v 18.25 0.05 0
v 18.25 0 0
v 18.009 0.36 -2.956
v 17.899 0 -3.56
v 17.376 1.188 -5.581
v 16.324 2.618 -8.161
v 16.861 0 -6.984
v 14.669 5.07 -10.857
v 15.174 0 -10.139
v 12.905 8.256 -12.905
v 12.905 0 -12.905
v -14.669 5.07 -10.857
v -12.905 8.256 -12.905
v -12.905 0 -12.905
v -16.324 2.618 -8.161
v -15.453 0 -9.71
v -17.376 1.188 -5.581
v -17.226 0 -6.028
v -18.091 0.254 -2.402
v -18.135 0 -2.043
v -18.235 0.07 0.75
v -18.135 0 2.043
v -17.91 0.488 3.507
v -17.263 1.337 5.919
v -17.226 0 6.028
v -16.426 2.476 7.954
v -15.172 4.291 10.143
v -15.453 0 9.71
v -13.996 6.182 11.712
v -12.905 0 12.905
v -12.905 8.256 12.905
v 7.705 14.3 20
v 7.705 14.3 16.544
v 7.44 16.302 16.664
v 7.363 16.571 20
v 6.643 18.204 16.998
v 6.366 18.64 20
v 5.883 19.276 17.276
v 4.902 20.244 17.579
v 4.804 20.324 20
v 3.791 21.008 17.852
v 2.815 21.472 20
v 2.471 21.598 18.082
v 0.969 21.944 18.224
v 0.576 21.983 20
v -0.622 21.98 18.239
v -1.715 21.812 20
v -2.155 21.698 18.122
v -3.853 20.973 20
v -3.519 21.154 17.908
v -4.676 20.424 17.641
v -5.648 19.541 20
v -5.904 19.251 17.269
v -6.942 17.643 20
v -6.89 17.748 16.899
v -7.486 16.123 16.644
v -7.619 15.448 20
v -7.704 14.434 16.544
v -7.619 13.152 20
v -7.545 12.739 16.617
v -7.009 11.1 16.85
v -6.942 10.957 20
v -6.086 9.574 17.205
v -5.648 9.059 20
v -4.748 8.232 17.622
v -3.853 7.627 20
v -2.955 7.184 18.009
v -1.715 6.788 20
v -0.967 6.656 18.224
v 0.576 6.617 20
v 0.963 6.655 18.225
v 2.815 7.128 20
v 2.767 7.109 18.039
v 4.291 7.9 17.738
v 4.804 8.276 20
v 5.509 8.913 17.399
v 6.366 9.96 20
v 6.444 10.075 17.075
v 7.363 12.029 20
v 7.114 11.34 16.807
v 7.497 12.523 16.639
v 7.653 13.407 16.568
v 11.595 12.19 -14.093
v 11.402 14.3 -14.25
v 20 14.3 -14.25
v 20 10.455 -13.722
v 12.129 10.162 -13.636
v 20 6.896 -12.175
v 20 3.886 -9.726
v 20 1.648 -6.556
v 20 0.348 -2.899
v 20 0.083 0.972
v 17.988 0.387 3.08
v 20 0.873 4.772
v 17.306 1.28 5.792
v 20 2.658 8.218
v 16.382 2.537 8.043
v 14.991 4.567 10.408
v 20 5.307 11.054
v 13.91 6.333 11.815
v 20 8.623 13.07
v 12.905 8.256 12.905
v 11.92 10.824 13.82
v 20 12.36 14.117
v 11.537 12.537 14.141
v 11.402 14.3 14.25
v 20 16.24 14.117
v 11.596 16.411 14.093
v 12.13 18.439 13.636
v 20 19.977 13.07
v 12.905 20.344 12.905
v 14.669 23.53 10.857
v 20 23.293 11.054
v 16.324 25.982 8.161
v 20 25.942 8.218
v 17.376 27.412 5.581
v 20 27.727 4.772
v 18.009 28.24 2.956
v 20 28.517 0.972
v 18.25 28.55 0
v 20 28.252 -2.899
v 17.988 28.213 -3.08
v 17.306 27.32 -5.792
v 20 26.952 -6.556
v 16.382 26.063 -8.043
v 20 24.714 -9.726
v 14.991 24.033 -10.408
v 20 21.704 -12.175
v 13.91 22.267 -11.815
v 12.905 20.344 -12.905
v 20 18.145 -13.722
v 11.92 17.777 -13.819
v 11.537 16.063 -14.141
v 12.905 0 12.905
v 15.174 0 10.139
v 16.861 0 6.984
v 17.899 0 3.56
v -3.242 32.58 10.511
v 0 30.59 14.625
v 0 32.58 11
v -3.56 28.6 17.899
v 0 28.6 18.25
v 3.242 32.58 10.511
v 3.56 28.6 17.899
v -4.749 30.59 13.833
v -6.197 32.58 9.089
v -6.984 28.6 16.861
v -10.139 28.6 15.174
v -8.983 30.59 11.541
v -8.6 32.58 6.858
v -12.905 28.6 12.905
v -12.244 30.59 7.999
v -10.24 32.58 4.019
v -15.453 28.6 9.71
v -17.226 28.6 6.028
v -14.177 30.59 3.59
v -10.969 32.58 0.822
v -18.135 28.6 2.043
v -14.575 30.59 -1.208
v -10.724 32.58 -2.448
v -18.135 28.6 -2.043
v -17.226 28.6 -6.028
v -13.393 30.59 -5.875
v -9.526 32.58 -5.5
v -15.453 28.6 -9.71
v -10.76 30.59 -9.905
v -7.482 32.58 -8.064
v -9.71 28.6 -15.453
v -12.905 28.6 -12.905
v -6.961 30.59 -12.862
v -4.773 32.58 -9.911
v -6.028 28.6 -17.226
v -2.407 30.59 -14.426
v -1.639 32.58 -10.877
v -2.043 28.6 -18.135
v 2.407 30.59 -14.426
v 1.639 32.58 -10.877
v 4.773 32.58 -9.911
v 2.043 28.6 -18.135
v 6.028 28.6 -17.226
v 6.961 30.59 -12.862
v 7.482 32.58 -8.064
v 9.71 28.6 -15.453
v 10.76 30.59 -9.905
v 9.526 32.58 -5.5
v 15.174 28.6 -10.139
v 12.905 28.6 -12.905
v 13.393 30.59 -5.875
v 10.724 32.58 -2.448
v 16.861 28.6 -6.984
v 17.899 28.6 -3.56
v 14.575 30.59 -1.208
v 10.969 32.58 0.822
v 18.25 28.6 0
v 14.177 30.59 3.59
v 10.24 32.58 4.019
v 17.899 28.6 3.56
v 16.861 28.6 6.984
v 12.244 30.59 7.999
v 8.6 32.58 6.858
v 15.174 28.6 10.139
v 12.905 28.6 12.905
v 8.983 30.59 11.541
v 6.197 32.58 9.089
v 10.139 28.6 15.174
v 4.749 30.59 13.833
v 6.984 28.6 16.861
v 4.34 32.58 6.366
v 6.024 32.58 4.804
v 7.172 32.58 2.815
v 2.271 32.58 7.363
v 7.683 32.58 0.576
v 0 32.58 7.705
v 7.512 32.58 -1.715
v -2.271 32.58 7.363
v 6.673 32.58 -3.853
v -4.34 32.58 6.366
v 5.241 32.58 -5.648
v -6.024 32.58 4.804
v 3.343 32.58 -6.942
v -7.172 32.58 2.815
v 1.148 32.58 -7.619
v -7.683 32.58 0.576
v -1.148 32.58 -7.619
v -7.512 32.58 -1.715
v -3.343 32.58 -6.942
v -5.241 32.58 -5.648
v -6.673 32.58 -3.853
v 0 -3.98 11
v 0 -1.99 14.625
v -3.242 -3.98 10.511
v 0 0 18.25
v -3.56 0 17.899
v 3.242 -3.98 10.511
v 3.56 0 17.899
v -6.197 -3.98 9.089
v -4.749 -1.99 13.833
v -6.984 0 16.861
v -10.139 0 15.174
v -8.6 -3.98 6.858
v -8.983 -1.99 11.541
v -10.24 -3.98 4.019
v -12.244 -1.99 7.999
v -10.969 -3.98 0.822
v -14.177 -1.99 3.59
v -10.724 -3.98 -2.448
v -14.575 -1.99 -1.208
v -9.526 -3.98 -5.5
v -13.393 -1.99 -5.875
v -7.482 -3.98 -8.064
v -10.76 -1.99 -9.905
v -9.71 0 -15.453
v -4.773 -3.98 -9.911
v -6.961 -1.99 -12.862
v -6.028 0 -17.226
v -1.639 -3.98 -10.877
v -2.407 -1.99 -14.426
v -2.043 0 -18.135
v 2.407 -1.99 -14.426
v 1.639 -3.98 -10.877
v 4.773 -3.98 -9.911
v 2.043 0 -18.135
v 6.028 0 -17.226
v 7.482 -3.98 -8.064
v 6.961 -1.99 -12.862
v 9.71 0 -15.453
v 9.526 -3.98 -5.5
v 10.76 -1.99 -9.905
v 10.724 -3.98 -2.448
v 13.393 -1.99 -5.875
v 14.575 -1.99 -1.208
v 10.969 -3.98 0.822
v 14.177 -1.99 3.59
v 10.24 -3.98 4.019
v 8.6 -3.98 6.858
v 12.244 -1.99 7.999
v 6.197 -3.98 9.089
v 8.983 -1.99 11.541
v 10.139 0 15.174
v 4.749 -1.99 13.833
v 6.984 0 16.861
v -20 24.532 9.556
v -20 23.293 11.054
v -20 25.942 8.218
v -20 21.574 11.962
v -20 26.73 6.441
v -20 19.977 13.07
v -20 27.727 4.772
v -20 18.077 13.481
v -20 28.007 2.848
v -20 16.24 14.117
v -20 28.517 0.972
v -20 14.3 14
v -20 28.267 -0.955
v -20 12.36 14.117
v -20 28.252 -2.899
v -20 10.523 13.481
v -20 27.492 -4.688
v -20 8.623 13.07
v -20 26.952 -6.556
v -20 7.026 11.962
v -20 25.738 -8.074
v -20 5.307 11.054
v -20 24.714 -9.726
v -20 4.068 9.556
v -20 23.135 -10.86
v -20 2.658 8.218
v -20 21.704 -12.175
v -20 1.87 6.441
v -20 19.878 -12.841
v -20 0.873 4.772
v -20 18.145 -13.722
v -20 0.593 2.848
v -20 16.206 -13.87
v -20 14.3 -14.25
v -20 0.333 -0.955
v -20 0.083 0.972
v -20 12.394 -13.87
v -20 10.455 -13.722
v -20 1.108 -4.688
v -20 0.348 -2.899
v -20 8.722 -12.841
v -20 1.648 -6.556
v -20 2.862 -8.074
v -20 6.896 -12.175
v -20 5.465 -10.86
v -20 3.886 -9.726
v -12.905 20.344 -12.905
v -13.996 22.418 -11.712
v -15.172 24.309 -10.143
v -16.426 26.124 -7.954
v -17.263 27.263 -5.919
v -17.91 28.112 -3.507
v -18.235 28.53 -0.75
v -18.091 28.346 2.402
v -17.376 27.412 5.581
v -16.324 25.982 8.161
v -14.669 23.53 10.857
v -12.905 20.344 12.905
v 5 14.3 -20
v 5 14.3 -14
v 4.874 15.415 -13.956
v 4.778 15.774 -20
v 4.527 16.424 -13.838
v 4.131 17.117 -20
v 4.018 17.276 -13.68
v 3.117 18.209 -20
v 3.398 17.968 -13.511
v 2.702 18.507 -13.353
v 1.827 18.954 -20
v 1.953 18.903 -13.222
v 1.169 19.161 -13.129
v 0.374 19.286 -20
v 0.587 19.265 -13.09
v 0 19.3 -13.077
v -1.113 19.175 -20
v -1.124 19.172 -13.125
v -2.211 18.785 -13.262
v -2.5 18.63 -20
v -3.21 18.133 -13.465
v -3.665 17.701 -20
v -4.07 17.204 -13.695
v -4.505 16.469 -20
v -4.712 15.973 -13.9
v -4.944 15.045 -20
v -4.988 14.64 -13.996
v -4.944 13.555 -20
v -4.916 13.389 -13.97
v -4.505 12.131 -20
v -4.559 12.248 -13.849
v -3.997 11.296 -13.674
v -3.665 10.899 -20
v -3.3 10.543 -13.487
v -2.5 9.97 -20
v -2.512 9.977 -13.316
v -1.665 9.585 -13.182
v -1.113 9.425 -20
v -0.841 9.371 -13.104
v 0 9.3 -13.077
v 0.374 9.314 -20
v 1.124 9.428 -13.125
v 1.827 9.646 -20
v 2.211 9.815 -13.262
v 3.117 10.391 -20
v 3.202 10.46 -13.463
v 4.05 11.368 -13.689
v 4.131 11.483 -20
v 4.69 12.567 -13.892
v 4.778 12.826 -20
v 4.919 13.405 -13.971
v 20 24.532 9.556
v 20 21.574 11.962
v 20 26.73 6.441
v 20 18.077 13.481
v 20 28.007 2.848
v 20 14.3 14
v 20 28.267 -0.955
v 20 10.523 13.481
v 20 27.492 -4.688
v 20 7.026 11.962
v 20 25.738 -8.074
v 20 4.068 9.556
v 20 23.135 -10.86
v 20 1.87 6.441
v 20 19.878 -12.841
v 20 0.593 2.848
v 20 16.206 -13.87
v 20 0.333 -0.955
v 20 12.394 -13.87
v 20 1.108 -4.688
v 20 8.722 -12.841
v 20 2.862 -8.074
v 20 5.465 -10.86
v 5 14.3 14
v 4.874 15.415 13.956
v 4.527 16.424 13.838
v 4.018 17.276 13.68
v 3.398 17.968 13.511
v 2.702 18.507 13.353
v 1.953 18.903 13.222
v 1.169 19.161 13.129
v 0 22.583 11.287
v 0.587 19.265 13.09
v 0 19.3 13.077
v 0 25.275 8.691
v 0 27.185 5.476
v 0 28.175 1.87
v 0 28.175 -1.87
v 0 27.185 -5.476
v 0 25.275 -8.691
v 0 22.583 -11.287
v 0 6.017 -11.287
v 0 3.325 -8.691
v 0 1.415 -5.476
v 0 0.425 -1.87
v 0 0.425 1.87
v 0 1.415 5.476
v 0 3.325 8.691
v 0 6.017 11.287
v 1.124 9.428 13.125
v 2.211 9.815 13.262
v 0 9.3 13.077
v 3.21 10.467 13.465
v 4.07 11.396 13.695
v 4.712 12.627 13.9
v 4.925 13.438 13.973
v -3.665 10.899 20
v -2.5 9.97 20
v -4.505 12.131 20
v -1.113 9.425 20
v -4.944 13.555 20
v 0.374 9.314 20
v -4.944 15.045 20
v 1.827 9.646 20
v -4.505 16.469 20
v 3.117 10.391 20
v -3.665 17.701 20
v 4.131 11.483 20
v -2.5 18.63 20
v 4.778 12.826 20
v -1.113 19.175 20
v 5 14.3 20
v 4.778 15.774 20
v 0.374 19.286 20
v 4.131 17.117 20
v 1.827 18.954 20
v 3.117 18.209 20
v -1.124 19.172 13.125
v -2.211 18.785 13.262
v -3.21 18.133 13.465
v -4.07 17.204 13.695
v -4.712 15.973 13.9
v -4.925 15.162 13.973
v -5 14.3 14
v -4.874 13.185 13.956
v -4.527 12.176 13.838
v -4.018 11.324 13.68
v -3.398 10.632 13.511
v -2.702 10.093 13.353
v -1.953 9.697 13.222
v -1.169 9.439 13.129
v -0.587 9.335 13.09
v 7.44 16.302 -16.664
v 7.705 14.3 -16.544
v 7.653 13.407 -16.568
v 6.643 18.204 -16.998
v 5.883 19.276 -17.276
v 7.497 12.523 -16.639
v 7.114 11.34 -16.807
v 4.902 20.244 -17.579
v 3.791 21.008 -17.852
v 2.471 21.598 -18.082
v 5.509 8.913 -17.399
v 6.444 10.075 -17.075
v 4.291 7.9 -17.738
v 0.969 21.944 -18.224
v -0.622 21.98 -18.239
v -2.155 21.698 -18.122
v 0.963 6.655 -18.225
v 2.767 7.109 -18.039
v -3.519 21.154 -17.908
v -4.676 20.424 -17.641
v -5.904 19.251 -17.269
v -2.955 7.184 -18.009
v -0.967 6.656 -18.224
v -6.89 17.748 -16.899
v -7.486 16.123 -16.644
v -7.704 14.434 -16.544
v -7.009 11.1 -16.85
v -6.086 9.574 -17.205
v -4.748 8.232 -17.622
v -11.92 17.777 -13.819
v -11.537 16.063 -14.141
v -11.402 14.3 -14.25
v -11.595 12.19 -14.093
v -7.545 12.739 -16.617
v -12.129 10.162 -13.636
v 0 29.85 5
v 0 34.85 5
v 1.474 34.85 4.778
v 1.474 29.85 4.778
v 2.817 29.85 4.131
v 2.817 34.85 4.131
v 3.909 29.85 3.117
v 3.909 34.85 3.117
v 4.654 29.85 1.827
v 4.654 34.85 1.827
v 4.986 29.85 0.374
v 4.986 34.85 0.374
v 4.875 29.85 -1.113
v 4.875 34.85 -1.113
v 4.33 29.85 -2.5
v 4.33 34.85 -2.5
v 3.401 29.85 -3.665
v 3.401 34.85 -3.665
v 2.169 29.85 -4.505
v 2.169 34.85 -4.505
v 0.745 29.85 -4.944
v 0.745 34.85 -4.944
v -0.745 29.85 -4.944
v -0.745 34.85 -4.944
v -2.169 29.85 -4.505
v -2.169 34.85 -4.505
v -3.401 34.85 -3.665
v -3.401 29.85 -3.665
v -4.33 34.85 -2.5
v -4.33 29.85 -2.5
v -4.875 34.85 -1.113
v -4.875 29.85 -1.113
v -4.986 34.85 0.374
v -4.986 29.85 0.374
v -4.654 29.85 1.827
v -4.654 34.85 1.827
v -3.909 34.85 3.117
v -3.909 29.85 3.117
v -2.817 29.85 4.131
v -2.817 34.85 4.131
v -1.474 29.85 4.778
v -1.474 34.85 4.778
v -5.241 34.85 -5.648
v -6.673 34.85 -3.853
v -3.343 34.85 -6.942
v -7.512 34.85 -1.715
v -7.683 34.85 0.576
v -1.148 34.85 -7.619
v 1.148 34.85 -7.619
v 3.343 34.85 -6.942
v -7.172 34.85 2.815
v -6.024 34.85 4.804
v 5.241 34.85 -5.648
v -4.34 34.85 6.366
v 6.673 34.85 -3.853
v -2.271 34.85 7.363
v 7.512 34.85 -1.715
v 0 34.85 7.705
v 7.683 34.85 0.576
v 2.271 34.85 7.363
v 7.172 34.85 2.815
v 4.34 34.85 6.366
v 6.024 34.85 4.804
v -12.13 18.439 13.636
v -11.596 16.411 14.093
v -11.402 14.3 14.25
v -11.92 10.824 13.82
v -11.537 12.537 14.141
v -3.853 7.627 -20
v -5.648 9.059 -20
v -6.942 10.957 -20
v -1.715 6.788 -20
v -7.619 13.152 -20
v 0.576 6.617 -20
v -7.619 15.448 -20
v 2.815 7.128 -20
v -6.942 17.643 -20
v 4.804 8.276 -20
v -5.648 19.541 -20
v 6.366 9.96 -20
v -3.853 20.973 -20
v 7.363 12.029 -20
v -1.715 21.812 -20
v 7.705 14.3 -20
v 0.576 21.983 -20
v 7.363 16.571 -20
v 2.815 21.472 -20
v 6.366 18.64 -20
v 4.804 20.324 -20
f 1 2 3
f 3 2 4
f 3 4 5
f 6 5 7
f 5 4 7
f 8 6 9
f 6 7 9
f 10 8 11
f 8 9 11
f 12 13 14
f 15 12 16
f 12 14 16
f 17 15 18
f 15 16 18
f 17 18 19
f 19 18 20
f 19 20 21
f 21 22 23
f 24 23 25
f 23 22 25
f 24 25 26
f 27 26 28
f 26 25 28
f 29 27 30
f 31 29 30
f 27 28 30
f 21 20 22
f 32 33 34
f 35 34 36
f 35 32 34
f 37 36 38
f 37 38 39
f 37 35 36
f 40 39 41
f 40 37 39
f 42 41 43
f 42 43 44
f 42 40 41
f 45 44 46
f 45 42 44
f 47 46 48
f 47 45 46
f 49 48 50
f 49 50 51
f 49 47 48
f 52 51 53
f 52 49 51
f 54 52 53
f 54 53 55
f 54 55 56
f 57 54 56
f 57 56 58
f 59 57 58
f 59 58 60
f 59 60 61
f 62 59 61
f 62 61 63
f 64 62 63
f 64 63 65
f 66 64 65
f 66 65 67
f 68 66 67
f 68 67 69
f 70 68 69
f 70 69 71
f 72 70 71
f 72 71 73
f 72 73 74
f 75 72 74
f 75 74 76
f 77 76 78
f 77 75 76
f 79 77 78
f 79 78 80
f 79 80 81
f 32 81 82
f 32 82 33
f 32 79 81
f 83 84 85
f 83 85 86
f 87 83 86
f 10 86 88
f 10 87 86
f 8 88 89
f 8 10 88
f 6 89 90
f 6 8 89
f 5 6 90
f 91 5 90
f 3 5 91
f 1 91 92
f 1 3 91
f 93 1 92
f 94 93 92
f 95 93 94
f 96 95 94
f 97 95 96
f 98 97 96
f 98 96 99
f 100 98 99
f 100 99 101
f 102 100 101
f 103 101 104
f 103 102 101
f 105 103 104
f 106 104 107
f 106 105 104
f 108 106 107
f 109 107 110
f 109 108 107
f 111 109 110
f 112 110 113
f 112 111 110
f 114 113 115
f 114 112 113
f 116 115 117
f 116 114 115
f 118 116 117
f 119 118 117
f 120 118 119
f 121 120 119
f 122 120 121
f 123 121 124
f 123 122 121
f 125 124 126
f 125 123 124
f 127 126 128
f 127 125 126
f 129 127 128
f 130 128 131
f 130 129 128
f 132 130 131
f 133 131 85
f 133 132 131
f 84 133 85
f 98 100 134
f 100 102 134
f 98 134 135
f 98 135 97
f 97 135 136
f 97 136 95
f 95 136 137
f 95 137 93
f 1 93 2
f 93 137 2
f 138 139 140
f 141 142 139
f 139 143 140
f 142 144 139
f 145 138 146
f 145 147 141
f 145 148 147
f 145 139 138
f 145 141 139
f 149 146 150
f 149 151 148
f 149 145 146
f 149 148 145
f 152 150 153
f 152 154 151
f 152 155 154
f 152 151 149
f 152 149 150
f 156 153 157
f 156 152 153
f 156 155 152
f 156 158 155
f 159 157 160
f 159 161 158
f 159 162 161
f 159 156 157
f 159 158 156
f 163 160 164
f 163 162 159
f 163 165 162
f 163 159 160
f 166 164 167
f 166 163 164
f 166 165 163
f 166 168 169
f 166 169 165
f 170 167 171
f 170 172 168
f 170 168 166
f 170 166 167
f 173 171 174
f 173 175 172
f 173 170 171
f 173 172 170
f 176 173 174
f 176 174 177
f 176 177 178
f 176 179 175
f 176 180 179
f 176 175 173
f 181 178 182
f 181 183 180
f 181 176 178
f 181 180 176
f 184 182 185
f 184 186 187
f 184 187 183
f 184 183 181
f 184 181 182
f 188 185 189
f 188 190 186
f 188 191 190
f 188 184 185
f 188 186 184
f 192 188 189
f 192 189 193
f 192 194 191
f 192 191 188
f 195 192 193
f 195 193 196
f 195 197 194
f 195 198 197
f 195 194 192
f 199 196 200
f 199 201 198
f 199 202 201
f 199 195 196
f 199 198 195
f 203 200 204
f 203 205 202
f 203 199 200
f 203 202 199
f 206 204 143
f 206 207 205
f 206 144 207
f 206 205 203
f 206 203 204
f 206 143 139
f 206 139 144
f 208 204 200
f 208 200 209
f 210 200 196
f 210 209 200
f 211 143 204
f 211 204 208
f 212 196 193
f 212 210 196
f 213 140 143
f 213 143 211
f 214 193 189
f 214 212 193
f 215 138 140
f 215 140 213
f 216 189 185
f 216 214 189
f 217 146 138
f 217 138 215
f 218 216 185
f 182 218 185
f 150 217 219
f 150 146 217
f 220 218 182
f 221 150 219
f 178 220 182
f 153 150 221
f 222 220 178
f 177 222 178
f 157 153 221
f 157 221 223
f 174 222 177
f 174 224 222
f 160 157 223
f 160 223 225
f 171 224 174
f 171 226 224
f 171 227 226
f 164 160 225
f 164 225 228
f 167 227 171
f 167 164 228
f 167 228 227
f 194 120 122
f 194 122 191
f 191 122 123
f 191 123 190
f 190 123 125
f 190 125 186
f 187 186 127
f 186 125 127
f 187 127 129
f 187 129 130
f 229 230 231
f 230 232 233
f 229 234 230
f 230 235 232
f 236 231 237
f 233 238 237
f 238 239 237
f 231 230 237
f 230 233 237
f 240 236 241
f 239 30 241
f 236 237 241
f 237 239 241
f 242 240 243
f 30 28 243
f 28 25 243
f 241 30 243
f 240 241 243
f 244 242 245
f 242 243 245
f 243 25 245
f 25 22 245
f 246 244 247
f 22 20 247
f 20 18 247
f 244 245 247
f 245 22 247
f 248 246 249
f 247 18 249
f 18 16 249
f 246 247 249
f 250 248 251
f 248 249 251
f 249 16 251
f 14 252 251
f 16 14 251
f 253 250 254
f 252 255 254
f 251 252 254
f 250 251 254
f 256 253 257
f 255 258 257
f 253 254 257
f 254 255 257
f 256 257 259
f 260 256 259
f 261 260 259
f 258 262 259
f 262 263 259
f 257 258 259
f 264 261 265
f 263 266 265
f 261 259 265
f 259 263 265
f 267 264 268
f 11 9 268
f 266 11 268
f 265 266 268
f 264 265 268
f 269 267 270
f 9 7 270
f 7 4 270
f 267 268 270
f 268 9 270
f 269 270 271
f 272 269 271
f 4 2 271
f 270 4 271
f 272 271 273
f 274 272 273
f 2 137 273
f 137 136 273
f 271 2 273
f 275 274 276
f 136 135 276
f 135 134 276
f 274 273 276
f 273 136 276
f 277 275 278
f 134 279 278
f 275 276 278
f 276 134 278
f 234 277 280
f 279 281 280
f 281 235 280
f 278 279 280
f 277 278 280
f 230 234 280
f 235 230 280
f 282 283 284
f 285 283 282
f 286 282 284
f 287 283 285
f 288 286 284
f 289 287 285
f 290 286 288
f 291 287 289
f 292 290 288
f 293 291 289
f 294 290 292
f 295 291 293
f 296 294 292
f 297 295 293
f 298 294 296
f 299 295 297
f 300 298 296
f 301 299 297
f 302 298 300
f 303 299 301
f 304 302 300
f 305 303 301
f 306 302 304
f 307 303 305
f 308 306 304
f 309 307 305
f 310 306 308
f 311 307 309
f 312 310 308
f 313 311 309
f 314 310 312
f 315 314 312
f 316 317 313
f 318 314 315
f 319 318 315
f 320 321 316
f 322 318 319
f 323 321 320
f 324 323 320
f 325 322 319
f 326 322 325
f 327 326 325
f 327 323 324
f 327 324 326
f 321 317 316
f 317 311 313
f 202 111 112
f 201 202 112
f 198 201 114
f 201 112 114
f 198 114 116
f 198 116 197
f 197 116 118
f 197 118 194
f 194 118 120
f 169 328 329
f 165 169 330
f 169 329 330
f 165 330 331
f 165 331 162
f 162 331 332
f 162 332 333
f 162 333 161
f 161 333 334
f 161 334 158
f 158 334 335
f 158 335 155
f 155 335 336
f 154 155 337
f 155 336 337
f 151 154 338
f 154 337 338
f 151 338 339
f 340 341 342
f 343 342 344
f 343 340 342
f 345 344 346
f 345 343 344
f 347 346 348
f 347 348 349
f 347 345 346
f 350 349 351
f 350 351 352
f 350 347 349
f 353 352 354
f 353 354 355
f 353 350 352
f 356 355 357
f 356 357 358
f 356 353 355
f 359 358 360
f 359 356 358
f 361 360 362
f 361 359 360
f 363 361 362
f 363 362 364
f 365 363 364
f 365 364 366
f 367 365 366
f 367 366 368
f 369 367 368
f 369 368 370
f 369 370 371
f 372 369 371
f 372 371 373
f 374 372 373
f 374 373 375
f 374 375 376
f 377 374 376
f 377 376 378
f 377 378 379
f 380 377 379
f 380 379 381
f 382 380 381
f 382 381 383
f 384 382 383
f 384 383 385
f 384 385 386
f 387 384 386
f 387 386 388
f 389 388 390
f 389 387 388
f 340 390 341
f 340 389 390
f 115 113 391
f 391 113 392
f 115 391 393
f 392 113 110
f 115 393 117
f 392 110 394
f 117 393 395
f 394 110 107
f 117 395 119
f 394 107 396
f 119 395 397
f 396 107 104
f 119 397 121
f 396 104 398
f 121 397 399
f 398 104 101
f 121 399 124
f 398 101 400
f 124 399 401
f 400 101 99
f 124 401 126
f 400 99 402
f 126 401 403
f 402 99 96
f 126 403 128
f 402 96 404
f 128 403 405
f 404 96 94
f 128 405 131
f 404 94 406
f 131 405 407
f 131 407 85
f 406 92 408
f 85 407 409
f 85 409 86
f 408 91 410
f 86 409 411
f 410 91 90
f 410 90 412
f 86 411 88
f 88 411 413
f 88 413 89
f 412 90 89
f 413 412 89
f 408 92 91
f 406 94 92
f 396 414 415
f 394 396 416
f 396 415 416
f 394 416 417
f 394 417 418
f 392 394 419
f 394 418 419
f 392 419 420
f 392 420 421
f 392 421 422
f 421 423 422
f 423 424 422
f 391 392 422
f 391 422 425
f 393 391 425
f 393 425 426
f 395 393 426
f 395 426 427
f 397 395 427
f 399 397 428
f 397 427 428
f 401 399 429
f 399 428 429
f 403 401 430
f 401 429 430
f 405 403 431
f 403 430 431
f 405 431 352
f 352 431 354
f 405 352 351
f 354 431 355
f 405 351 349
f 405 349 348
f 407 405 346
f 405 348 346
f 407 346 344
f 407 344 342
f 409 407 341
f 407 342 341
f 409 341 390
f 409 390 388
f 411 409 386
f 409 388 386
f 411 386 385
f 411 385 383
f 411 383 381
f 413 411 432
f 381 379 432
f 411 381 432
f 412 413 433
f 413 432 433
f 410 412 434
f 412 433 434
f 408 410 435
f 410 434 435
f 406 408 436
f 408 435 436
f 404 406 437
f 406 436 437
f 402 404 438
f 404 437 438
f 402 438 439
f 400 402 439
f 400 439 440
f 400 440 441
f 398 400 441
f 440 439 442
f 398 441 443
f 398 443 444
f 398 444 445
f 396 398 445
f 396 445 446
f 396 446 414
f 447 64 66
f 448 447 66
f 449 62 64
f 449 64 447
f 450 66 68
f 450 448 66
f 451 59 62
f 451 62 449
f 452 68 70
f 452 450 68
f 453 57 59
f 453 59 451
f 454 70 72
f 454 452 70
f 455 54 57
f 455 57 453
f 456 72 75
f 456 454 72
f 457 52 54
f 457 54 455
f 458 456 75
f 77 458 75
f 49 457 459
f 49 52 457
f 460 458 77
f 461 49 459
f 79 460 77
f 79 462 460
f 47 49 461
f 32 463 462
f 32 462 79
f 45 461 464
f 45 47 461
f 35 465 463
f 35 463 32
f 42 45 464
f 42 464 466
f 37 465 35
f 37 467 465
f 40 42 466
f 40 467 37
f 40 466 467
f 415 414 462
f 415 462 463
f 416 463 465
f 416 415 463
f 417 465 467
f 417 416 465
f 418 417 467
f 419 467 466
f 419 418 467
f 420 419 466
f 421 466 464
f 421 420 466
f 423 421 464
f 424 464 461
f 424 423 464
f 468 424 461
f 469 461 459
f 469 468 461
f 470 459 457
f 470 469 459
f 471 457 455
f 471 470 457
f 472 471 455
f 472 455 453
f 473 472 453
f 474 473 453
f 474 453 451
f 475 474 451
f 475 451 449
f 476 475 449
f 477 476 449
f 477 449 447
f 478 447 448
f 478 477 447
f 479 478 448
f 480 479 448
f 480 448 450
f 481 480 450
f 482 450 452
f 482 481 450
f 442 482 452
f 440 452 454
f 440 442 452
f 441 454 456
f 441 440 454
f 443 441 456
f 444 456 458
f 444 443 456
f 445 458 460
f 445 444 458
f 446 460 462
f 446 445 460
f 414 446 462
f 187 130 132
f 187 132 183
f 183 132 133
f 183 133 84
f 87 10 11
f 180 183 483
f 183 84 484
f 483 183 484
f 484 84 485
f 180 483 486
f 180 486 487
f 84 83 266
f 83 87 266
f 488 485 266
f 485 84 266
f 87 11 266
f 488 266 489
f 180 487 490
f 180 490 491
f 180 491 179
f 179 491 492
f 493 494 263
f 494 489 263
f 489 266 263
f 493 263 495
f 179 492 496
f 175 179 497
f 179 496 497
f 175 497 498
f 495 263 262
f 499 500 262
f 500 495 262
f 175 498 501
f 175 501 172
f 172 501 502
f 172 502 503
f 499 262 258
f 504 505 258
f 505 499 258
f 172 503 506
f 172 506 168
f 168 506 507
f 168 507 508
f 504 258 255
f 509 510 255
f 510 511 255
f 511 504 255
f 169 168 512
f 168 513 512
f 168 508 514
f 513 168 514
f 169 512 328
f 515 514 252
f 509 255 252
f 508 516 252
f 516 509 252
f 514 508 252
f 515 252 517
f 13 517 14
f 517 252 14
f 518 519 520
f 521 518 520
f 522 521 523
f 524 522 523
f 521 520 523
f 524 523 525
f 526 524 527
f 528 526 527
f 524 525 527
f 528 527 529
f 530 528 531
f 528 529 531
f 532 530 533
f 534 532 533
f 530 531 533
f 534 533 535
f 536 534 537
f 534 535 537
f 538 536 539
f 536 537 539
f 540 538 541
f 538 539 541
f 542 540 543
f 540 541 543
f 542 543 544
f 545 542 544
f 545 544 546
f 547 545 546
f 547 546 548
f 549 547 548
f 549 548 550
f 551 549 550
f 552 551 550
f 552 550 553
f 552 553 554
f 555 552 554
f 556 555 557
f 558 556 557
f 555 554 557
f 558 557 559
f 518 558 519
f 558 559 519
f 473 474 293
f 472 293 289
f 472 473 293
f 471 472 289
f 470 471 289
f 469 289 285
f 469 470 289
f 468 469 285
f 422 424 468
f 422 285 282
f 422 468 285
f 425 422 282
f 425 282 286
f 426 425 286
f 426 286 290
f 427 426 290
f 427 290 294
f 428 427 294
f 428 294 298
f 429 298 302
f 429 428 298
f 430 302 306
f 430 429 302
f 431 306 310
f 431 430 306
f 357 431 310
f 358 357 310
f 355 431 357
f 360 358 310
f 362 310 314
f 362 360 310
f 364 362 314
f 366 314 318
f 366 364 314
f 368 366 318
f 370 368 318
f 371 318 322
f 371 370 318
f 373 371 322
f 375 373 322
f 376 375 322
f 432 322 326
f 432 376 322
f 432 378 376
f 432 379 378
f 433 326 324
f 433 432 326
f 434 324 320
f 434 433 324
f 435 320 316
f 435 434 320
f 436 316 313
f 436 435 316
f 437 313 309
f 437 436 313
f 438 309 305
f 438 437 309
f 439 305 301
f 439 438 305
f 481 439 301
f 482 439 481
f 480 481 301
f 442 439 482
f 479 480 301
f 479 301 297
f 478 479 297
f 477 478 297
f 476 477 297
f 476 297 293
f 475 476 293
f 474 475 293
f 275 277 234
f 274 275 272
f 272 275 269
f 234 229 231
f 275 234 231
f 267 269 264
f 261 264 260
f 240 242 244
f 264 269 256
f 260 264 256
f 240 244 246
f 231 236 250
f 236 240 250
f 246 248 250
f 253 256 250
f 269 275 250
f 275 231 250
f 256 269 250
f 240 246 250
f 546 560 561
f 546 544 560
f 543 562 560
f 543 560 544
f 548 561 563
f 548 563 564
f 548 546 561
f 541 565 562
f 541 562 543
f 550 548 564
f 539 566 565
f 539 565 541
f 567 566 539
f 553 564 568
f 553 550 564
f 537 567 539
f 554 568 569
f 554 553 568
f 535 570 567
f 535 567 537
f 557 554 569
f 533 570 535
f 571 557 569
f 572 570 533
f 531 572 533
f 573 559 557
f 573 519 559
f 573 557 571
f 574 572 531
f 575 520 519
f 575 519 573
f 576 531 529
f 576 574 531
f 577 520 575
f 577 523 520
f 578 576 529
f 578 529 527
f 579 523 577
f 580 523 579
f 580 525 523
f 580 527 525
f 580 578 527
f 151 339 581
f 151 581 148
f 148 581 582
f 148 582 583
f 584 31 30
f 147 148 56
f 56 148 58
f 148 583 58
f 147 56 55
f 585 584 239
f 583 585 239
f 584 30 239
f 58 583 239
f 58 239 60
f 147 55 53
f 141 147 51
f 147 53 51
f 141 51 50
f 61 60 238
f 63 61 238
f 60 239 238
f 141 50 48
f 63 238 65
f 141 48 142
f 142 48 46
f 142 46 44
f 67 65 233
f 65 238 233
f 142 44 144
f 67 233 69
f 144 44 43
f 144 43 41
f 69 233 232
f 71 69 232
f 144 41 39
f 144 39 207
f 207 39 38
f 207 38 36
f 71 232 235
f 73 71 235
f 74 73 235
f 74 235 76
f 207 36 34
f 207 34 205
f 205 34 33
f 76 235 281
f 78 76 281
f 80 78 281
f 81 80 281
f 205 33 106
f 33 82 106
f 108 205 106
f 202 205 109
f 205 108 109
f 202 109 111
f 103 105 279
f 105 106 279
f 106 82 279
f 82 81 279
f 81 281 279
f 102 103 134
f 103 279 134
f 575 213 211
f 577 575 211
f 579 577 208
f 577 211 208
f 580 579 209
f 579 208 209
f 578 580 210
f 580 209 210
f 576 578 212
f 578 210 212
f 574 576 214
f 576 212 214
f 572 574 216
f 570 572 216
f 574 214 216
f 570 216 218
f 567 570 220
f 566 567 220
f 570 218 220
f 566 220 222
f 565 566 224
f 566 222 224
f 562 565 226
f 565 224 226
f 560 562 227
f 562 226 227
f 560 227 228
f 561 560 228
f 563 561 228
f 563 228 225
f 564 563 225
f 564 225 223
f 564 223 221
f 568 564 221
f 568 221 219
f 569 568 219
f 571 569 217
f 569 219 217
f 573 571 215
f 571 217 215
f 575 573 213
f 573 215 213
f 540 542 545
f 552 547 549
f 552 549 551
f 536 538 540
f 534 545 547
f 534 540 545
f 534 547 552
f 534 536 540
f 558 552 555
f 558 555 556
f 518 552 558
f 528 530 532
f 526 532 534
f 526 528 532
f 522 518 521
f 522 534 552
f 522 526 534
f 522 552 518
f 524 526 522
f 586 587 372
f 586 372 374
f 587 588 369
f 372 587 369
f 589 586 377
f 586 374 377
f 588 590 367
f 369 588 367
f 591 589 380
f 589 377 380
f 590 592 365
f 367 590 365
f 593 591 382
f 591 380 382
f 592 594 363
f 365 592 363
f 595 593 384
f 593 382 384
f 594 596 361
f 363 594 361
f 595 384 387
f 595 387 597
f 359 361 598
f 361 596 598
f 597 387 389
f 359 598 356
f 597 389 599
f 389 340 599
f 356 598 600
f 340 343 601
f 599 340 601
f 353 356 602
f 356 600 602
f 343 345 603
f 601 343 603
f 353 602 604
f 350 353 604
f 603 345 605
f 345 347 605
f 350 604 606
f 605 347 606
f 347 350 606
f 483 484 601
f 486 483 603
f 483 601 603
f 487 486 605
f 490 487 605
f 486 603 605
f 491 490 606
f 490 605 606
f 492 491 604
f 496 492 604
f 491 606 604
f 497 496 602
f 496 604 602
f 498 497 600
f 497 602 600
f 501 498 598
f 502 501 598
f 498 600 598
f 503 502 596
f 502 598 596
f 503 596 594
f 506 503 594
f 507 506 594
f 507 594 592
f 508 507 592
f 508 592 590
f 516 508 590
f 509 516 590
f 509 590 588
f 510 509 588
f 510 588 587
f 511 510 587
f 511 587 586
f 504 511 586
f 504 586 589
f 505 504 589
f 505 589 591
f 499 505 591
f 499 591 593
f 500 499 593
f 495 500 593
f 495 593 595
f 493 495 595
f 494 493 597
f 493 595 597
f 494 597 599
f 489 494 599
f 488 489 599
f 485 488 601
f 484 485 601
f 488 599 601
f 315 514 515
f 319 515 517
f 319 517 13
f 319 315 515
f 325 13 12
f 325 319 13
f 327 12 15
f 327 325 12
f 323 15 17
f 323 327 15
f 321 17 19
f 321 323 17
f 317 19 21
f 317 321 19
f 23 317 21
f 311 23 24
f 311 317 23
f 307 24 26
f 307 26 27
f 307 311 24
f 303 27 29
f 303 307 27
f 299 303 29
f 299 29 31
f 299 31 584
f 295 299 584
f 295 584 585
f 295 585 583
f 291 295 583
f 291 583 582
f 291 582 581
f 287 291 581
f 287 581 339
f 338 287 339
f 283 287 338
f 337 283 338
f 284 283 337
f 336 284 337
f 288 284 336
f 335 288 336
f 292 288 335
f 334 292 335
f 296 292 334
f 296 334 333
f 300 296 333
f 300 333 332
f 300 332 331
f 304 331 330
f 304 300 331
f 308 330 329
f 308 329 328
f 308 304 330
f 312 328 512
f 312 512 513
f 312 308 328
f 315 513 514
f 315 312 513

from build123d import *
from build123d.topology import SkipClean

# Parameters (mm, degrees)
SKETCH1_W                = 25.809397514
SKETCH1_H                = 25.809397514
BOSS_EXTRUDE1_DEPTH      = 28.6
BOSS_EXTRUDE3_DEPTH      = 28.6
CUT_EXTRUDE4_DEPTH       = 42.564184101
CUT_EXTRUDE4_DEPTH_BACK  = 42.564184101
SKETCH4_R                = 14.25
SKETCH5_R                = 14.25
SKETCH5_R_2              = 14
BOSS_EXTRUDE4_DEPTH      = 20
SKETCH6_R                = 7.705
BOSS_EXTRUDE5_DEPTH      = 2.27
SKETCH7_R                = 5
CUT_EXTRUDE5_DEPTH       = 5
BOSS_EXTRUDE7_REACH      = 66.131
BOSS_EXTRUDE7_END_RADIUS = 18.25
BOSS_EXTRUDE7_START      = 20
SKETCH8_R                = 7.705
CUT_EXTRUDE8_DEPTH       = 57.696759272
CUT_EXTRUDE8_DEPTH_BACK  = 57.696759272
SKETCH12_R               = 5


with BuildPart() as part:
    # Sketch1 → Boss-Extrude1 (new body)
    with BuildSketch(Plane(origin=(0, 0, 0), x_dir=(1, 0, 0), z_dir=(0, 1, 0))):
        Rectangle(SKETCH1_W, SKETCH1_H)
    extrude(amount=BOSS_EXTRUDE1_DEPTH)

    # Sketch2 → Revolve1 (revolve)
    with BuildSketch(Plane.ZY):
        Polygon((0, 0), (0, -3.98), (11, -3.98), (18.25, 0), align=None)
    revolve1 = revolve(axis=Axis((0, 0, 0), (0, -1, 0)))

    # Mirror2: Revolve1 across plane
    add(revolve1.mirror(Plane(origin=(0, 14.3, 0), x_dir=(0, 0, 1), z_dir=(0, -1, 0))))

    # Sketch1<4> → Boss-Extrude3 (add)
    with BuildSketch(Plane(origin=(0, 0, 0), x_dir=(1, 0, 0), z_dir=(0, 1, 0))):
        with BuildLine():
            ThreePointArc((12.904698757, 12.904698757), (0, 18.25), (-12.904698757, 12.904698757))
            Line((-12.904698757, 12.904698757), (12.904698757, 12.904698757))
        make_face()
        with BuildLine():
            Line((-12.904698757, -12.904698757), (-12.904698757, 12.904698757))
            ThreePointArc((-12.904698757, 12.904698757), (-18.25, 0), (-12.904698757, -12.904698757))
        make_face()
        with BuildLine():
            ThreePointArc((12.904698757, -12.904698757), (18.25, 0), (12.904698757, 12.904698757))
            Line((12.904698757, 12.904698757), (12.904698757, -12.904698757))
        make_face()
        with BuildLine():
            Line((12.904698757, -12.904698757), (-12.904698757, -12.904698757))
            ThreePointArc((-12.904698757, -12.904698757), (0, -18.25), (12.904698757, -12.904698757))
        make_face()
    extrude(amount=BOSS_EXTRUDE3_DEPTH)

    # Sketch4 → Cut-Extrude4 (cut, two sides: drawn at the far end of the back side and taken through both)
    with SkipClean():  # the faces are left unmerged after this step: merging them gives an invalid solid
        with BuildSketch(Plane.ZY.offset(-CUT_EXTRUDE4_DEPTH_BACK)):
            with Locations((0, 14.3)):
                Circle(SKETCH4_R)
        extrude(amount=CUT_EXTRUDE4_DEPTH + CUT_EXTRUDE4_DEPTH_BACK, mode=Mode.SUBTRACT)

    # Sketch5 → Boss-Extrude4 (add, symmetric)
    with SkipClean():  # the faces are left unmerged after this step: merging them gives an invalid solid
        with BuildSketch(Plane.ZY):
            with Locations((0, 14.3)):
                Circle(SKETCH5_R)
            with Locations((0, 14.3)):
                Circle(SKETCH5_R_2, mode=Mode.SUBTRACT)
        extrude(amount=BOSS_EXTRUDE4_DEPTH, both=True)

    # Sketch6 → Boss-Extrude5 (add)
    with SkipClean():  # the faces are left unmerged after this step: merging them gives an invalid solid
        with BuildSketch(Plane(origin=(0, 32.58, 0), x_dir=(1, 0, 0), z_dir=(0, 1, 0))):
            Circle(SKETCH6_R)
        extrude(amount=BOSS_EXTRUDE5_DEPTH)

    # Sketch7 → Cut-Extrude5 (cut)
    with SkipClean():  # the faces are left unmerged after this step: merging them gives an invalid solid
        with BuildSketch(Plane(origin=(0, 34.85, 0), x_dir=(1, 0, 0), z_dir=(0, 1, 0))):
            Circle(SKETCH7_R)
        extrude(amount=-CUT_EXTRUDE5_DEPTH, mode=Mode.SUBTRACT)

    # Boss-Extrude7: up to this cylinder (the profile starts outside it)
    with SkipClean():  # the faces are left unmerged after this step: merging them gives an invalid solid
        boss_extrude7_end = Plane(origin=(0, 14.3, 0), z_dir=(0, -1, 0)) * Cylinder(BOSS_EXTRUDE7_END_RADIUS, 169.762, mode=Mode.PRIVATE)
        # Sketch8 → Boss-Extrude7 (add, up to the surface)
        with BuildSketch(Plane.XY.offset(BOSS_EXTRUDE7_START), mode=Mode.PRIVATE) as boss_extrude7_sk1:
            with Locations((0, 14.3)):
                Circle(SKETCH8_R)
        boss_extrude7_tool1 = extrude(boss_extrude7_sk1.sketch, amount=-BOSS_EXTRUDE7_REACH, mode=Mode.PRIVATE) - boss_extrude7_end
        boss_extrude7 = boss_extrude7_tool1.solids().sort_by_distance((0, 14.3, 20))[0]
        add(boss_extrude7)

    # Mirror5: Boss-Extrude7 across plane
    with SkipClean():  # the faces are left unmerged after this step: merging them gives an invalid solid
        add(boss_extrude7.mirror(Plane.XY))

    # Sketch12 → Cut-Extrude8 (cut, two sides: drawn at the far end of the back side and taken through both)
    with SkipClean():  # the faces are left unmerged after this step: merging them gives an invalid solid
        with BuildSketch(Plane.XY.offset(20).offset(-CUT_EXTRUDE8_DEPTH_BACK)):
            with Locations((0, 14.3)):
                Circle(SKETCH12_R)
        extrude(amount=CUT_EXTRUDE8_DEPTH + CUT_EXTRUDE8_DEPTH_BACK, mode=Mode.SUBTRACT)


solid = part.part
